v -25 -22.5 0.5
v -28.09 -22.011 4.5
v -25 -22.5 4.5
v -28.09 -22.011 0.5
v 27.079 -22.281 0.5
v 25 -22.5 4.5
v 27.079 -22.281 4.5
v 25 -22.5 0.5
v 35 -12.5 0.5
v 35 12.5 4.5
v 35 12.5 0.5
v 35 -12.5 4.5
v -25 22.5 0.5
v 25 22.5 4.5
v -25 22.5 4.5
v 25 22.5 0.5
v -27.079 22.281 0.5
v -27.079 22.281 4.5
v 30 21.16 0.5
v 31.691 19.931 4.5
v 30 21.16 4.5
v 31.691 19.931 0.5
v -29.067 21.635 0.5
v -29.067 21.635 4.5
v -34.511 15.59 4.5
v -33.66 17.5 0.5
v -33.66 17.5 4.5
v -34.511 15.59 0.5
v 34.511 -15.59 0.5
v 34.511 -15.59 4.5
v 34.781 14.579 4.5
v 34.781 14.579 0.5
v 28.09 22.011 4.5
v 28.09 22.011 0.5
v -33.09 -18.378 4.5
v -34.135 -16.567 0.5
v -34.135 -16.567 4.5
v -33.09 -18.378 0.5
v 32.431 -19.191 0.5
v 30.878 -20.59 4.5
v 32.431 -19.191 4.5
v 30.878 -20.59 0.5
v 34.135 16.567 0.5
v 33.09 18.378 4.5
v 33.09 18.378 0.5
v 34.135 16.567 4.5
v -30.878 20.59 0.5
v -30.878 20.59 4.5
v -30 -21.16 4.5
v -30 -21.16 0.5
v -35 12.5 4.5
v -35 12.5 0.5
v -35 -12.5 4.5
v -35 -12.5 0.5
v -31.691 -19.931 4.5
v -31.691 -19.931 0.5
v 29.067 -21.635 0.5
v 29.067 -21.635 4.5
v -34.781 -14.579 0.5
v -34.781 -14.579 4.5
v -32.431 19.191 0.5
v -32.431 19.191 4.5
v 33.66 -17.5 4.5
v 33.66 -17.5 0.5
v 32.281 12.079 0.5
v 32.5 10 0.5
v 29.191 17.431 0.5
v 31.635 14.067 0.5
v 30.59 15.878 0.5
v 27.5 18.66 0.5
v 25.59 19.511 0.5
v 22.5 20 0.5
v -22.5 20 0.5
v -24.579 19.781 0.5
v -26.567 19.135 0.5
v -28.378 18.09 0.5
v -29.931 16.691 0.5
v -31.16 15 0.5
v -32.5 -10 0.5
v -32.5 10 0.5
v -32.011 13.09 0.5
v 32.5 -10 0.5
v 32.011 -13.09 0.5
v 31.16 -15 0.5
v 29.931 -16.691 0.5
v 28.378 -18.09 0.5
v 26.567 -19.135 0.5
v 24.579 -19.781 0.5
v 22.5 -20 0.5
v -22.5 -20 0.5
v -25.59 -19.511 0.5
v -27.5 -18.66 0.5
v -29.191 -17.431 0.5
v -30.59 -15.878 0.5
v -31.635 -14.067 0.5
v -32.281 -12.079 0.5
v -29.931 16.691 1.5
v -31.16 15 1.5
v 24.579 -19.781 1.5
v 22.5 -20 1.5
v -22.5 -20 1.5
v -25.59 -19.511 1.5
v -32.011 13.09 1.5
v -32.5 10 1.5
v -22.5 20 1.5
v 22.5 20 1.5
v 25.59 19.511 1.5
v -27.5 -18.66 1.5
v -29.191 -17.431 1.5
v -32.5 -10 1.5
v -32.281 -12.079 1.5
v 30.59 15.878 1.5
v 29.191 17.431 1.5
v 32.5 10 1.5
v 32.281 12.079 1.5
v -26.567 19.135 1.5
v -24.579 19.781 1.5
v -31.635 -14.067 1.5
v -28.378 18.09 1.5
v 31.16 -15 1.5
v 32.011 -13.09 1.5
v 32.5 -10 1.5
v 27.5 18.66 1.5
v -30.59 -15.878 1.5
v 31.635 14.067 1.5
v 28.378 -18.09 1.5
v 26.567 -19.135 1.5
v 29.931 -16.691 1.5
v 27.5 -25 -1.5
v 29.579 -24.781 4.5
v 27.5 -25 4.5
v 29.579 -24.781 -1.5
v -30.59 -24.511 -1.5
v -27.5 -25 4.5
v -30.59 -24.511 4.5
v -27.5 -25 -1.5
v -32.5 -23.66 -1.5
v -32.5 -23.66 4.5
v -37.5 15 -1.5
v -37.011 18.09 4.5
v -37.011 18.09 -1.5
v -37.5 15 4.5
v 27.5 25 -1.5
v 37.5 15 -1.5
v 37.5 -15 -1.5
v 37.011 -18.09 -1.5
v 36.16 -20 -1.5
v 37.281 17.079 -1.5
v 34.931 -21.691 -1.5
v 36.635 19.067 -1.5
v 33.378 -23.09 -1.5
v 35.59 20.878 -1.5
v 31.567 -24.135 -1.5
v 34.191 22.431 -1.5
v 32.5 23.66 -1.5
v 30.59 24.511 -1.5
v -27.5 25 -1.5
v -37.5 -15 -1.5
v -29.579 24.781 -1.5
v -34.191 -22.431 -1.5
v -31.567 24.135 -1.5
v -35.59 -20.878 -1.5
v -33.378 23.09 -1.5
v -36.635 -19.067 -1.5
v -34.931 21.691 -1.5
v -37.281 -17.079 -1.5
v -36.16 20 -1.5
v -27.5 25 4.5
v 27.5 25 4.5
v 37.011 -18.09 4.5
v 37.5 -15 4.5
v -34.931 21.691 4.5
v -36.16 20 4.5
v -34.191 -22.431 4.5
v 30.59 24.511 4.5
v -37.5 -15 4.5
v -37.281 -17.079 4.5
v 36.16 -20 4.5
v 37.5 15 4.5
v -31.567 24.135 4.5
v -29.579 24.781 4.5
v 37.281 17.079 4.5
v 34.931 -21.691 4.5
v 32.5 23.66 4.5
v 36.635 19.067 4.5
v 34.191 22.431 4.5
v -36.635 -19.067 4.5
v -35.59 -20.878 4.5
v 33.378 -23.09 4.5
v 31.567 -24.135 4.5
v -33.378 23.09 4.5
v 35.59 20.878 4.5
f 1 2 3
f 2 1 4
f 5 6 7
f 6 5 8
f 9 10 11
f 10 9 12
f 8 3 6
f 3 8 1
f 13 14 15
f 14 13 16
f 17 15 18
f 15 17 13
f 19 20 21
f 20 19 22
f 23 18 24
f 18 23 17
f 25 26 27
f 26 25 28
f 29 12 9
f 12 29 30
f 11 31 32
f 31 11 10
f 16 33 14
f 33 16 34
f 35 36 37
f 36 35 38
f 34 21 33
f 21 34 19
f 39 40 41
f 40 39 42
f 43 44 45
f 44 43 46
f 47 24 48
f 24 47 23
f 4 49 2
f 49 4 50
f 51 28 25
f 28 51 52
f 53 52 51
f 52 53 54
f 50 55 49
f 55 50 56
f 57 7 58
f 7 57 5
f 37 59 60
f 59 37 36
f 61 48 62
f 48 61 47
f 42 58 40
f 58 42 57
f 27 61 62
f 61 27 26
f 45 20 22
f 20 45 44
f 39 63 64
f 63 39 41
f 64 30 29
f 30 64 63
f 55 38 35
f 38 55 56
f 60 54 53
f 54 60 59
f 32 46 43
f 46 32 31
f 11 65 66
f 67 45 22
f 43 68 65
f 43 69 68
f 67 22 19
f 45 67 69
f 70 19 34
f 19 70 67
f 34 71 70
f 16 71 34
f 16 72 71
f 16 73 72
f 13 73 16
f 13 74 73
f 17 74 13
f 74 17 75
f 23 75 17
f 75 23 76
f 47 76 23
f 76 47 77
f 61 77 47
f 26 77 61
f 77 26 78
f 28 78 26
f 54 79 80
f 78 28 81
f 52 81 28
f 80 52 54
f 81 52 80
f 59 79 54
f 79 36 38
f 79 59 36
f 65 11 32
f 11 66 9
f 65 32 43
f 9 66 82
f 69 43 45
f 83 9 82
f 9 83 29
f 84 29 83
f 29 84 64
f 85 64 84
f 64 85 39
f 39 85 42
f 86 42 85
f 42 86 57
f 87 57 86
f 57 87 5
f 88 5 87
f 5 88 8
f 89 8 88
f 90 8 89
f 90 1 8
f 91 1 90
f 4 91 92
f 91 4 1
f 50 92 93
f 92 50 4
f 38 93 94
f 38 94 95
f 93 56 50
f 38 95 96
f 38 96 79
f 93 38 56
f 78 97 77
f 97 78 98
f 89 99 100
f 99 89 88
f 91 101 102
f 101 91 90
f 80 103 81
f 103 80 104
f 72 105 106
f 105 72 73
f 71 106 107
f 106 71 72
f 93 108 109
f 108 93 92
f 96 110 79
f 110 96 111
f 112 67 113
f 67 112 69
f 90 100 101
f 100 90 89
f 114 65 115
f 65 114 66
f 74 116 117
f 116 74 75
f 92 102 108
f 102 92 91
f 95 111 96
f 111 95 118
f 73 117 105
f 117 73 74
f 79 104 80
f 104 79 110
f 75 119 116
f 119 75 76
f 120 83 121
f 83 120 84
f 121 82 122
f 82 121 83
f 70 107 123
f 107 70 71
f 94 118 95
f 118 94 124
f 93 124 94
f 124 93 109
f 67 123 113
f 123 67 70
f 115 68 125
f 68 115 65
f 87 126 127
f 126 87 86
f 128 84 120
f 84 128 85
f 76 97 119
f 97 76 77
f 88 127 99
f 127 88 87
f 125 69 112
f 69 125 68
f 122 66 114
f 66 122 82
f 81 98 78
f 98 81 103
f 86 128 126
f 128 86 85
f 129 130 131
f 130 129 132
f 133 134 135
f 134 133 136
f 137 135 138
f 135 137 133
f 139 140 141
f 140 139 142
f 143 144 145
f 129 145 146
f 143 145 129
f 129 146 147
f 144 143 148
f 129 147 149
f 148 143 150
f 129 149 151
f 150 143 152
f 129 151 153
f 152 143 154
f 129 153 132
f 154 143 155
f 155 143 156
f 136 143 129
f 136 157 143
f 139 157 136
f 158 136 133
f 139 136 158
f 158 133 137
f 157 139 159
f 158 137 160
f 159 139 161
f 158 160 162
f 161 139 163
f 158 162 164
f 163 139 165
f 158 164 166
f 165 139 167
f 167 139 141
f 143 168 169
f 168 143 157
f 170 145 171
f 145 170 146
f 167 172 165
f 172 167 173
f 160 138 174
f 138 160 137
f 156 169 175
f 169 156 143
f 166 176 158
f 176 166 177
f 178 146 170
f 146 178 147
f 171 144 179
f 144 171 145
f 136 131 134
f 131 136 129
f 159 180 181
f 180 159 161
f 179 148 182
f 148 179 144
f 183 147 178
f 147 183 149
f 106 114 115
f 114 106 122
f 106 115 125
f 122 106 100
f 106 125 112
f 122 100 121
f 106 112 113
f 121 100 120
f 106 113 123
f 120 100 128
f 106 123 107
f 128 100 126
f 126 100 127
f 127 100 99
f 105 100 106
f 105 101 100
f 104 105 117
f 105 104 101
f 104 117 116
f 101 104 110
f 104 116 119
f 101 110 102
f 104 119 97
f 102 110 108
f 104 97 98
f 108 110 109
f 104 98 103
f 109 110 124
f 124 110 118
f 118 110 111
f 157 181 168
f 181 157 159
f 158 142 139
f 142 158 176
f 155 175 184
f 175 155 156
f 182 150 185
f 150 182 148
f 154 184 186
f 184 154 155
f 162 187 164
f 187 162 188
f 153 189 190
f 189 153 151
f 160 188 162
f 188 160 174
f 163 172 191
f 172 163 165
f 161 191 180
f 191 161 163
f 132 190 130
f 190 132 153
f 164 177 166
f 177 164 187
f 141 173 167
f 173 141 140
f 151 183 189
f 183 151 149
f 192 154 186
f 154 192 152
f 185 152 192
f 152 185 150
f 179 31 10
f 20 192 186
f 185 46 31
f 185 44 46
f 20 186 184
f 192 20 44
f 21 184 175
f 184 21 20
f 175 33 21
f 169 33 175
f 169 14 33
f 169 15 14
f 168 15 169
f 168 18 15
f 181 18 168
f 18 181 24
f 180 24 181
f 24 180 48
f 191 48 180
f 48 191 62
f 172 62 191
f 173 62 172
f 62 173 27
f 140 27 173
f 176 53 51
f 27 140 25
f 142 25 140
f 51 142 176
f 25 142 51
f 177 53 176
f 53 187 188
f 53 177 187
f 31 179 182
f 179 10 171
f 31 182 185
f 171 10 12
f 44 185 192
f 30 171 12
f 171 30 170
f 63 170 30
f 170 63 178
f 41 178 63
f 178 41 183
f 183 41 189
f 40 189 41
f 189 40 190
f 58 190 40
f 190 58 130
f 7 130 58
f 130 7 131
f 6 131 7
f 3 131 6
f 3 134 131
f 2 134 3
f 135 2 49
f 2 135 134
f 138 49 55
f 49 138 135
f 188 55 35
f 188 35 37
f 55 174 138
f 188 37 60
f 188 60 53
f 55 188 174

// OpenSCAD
/*
 * Test for a stamp mold
 */
echo(version=version());

// Base plate
// ----------
plateWidth = 75;    // 50
plateLength = 50;   // 50
plateThickNess = 3;
cornerRadius = 10;

logo = "./images/onecamel.2.png"; 
imgRatio = 1.3;
logox = 450 * imgRatio; 
logoy = 450 * imgRatio; 

module roundedRect(size, radius) {  
	linear_extrude(height=size.z, center=true) {
		offset(radius) offset(-radius) {
			square([size.x, size.y], center = true);
		}
	}
}

difference() {  
	union() {
		difference() {
			roundedRect([plateWidth, plateLength, plateThickNess], cornerRadius);
			translate([0, 0, 2]) {
				scale([.9 * plateWidth / logox, .9 * plateWidth / logoy, .02]) {
					color("white") {
						rotate([0, 0, -90]) {
							surface(file=logo, invert=true, center=true);
						}
					}
				}
        // the groove around the picture
        difference() {
          roundedRect([plateWidth -  5, plateLength -  5, plateThickNess], cornerRadius);
          roundedRect([plateWidth - 10, plateLength - 10, plateThickNess * 1.1], cornerRadius);
        }
			}
		}
		// The frame
		translate([0, 0, (plateThickNess / 1)]) {
			difference() {
				roundedRect([plateWidth, plateLength, plateThickNess], cornerRadius);
				roundedRect([plateWidth - 5, plateLength - 5, plateThickNess * 1.1], cornerRadius);
			}
		}
	}
}
